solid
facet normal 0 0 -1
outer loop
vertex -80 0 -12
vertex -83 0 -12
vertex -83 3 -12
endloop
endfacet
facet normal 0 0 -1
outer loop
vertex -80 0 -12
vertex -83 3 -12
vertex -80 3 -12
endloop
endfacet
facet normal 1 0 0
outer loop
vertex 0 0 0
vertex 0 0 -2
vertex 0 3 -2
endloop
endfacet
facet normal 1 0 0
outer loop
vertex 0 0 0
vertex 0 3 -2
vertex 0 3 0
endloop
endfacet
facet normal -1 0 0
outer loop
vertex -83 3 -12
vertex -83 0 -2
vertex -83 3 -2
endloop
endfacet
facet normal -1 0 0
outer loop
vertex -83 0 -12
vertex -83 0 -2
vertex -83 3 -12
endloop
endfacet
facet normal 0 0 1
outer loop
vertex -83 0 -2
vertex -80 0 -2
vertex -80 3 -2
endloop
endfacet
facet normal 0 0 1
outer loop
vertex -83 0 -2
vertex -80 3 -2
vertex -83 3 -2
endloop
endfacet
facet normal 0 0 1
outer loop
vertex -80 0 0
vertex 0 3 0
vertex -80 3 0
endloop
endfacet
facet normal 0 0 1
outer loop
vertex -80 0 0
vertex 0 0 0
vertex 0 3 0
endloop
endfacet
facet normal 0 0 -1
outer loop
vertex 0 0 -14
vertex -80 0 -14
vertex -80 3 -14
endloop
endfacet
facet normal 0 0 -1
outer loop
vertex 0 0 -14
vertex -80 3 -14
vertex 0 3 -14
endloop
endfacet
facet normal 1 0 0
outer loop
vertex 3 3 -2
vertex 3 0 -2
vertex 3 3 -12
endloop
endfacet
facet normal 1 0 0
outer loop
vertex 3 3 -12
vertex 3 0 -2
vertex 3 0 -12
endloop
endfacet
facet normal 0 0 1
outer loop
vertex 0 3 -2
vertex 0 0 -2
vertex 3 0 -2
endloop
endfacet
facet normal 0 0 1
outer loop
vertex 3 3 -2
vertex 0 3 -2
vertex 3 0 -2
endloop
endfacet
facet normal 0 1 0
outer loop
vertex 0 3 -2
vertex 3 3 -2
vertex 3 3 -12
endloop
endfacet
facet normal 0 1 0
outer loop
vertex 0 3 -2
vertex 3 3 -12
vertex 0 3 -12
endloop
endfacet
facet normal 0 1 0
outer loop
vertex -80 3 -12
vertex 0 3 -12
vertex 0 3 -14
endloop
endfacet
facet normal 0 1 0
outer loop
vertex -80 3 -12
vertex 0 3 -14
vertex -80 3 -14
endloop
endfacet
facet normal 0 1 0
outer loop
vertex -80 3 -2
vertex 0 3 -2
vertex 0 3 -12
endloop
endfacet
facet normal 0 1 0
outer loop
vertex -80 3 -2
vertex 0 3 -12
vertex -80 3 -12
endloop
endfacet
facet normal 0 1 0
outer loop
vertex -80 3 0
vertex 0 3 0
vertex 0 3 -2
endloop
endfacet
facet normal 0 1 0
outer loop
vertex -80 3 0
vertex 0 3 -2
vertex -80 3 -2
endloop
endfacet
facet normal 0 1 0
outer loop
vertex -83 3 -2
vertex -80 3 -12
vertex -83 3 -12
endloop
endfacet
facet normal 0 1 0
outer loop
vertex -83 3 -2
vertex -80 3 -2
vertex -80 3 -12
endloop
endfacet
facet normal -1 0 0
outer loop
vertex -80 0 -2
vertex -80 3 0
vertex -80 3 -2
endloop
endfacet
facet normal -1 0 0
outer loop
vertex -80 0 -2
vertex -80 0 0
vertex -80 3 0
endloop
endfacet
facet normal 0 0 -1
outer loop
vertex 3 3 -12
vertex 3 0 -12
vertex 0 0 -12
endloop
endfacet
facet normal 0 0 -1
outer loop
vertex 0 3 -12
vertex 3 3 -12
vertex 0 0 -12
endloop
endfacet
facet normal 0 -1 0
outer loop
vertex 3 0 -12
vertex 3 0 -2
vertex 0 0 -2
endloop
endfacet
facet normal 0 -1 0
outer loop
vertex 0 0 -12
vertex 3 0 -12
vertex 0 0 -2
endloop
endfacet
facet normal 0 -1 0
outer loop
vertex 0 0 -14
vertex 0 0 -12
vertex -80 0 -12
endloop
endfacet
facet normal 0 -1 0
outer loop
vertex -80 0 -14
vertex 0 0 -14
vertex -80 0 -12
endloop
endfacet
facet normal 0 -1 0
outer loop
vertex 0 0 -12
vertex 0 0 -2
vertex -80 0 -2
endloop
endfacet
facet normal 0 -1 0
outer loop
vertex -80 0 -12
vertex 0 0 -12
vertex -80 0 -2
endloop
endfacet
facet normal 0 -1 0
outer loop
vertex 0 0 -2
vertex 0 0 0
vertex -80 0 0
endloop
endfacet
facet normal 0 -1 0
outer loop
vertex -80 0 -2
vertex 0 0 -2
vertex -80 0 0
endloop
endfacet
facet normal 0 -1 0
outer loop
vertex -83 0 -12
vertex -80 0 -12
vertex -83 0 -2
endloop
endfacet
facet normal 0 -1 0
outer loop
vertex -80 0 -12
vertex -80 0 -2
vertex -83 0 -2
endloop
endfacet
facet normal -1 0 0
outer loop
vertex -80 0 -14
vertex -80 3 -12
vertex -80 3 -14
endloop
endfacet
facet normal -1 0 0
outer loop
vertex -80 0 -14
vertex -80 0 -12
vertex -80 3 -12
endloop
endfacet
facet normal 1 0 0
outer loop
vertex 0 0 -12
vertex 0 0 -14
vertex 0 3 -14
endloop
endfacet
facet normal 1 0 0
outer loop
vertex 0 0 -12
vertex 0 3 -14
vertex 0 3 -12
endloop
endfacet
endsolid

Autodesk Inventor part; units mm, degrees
ref_plane "YZ Plane" through (0, 0, 0) normal (1, 0, 0) x (0, 1, 0)
ref_plane "XZ Plane" through (0, 0, 0) normal (0, 1, 0) x (-1, 0, 0)
ref_plane "XY Plane" through (0, 0, 0) normal (0, 0, 1) x (1, 0, 0)
sketch "Sketch1" plane through (0, 0, 0) normal (0, 1, 0) x (-1, 0, 0)
  line L0 (0, 0) -> (80, 0)
  line L1 (80, 0) -> (80, -14)
  line L2 (80, -14) -> (0, -14)
  line L3 (0, -14) -> (0, 0)
  line L4 (80, -2) -> (83, -2)
  line L5 (83, -2) -> (83, -12)
  line L6 (83, -12) -> (80, -12)
  line L7 (40, -14) -> (40, 0) construction
  line L8 (0, -2) -> (-3, -2)
  line L9 (-3, -2) -> (-3, -12)
  line L10 (-3, -12) -> (0, -12)
  dimension "d0" = 14
  dimension "d1" = 80
  dimension "d2" = 2
  dimension "d3" = 10
  dimension "d4" = 3
extrude "Extrusion1" add sketch "Sketch1" along normal blind 3
properties part number "soporte_base_parqueo"
